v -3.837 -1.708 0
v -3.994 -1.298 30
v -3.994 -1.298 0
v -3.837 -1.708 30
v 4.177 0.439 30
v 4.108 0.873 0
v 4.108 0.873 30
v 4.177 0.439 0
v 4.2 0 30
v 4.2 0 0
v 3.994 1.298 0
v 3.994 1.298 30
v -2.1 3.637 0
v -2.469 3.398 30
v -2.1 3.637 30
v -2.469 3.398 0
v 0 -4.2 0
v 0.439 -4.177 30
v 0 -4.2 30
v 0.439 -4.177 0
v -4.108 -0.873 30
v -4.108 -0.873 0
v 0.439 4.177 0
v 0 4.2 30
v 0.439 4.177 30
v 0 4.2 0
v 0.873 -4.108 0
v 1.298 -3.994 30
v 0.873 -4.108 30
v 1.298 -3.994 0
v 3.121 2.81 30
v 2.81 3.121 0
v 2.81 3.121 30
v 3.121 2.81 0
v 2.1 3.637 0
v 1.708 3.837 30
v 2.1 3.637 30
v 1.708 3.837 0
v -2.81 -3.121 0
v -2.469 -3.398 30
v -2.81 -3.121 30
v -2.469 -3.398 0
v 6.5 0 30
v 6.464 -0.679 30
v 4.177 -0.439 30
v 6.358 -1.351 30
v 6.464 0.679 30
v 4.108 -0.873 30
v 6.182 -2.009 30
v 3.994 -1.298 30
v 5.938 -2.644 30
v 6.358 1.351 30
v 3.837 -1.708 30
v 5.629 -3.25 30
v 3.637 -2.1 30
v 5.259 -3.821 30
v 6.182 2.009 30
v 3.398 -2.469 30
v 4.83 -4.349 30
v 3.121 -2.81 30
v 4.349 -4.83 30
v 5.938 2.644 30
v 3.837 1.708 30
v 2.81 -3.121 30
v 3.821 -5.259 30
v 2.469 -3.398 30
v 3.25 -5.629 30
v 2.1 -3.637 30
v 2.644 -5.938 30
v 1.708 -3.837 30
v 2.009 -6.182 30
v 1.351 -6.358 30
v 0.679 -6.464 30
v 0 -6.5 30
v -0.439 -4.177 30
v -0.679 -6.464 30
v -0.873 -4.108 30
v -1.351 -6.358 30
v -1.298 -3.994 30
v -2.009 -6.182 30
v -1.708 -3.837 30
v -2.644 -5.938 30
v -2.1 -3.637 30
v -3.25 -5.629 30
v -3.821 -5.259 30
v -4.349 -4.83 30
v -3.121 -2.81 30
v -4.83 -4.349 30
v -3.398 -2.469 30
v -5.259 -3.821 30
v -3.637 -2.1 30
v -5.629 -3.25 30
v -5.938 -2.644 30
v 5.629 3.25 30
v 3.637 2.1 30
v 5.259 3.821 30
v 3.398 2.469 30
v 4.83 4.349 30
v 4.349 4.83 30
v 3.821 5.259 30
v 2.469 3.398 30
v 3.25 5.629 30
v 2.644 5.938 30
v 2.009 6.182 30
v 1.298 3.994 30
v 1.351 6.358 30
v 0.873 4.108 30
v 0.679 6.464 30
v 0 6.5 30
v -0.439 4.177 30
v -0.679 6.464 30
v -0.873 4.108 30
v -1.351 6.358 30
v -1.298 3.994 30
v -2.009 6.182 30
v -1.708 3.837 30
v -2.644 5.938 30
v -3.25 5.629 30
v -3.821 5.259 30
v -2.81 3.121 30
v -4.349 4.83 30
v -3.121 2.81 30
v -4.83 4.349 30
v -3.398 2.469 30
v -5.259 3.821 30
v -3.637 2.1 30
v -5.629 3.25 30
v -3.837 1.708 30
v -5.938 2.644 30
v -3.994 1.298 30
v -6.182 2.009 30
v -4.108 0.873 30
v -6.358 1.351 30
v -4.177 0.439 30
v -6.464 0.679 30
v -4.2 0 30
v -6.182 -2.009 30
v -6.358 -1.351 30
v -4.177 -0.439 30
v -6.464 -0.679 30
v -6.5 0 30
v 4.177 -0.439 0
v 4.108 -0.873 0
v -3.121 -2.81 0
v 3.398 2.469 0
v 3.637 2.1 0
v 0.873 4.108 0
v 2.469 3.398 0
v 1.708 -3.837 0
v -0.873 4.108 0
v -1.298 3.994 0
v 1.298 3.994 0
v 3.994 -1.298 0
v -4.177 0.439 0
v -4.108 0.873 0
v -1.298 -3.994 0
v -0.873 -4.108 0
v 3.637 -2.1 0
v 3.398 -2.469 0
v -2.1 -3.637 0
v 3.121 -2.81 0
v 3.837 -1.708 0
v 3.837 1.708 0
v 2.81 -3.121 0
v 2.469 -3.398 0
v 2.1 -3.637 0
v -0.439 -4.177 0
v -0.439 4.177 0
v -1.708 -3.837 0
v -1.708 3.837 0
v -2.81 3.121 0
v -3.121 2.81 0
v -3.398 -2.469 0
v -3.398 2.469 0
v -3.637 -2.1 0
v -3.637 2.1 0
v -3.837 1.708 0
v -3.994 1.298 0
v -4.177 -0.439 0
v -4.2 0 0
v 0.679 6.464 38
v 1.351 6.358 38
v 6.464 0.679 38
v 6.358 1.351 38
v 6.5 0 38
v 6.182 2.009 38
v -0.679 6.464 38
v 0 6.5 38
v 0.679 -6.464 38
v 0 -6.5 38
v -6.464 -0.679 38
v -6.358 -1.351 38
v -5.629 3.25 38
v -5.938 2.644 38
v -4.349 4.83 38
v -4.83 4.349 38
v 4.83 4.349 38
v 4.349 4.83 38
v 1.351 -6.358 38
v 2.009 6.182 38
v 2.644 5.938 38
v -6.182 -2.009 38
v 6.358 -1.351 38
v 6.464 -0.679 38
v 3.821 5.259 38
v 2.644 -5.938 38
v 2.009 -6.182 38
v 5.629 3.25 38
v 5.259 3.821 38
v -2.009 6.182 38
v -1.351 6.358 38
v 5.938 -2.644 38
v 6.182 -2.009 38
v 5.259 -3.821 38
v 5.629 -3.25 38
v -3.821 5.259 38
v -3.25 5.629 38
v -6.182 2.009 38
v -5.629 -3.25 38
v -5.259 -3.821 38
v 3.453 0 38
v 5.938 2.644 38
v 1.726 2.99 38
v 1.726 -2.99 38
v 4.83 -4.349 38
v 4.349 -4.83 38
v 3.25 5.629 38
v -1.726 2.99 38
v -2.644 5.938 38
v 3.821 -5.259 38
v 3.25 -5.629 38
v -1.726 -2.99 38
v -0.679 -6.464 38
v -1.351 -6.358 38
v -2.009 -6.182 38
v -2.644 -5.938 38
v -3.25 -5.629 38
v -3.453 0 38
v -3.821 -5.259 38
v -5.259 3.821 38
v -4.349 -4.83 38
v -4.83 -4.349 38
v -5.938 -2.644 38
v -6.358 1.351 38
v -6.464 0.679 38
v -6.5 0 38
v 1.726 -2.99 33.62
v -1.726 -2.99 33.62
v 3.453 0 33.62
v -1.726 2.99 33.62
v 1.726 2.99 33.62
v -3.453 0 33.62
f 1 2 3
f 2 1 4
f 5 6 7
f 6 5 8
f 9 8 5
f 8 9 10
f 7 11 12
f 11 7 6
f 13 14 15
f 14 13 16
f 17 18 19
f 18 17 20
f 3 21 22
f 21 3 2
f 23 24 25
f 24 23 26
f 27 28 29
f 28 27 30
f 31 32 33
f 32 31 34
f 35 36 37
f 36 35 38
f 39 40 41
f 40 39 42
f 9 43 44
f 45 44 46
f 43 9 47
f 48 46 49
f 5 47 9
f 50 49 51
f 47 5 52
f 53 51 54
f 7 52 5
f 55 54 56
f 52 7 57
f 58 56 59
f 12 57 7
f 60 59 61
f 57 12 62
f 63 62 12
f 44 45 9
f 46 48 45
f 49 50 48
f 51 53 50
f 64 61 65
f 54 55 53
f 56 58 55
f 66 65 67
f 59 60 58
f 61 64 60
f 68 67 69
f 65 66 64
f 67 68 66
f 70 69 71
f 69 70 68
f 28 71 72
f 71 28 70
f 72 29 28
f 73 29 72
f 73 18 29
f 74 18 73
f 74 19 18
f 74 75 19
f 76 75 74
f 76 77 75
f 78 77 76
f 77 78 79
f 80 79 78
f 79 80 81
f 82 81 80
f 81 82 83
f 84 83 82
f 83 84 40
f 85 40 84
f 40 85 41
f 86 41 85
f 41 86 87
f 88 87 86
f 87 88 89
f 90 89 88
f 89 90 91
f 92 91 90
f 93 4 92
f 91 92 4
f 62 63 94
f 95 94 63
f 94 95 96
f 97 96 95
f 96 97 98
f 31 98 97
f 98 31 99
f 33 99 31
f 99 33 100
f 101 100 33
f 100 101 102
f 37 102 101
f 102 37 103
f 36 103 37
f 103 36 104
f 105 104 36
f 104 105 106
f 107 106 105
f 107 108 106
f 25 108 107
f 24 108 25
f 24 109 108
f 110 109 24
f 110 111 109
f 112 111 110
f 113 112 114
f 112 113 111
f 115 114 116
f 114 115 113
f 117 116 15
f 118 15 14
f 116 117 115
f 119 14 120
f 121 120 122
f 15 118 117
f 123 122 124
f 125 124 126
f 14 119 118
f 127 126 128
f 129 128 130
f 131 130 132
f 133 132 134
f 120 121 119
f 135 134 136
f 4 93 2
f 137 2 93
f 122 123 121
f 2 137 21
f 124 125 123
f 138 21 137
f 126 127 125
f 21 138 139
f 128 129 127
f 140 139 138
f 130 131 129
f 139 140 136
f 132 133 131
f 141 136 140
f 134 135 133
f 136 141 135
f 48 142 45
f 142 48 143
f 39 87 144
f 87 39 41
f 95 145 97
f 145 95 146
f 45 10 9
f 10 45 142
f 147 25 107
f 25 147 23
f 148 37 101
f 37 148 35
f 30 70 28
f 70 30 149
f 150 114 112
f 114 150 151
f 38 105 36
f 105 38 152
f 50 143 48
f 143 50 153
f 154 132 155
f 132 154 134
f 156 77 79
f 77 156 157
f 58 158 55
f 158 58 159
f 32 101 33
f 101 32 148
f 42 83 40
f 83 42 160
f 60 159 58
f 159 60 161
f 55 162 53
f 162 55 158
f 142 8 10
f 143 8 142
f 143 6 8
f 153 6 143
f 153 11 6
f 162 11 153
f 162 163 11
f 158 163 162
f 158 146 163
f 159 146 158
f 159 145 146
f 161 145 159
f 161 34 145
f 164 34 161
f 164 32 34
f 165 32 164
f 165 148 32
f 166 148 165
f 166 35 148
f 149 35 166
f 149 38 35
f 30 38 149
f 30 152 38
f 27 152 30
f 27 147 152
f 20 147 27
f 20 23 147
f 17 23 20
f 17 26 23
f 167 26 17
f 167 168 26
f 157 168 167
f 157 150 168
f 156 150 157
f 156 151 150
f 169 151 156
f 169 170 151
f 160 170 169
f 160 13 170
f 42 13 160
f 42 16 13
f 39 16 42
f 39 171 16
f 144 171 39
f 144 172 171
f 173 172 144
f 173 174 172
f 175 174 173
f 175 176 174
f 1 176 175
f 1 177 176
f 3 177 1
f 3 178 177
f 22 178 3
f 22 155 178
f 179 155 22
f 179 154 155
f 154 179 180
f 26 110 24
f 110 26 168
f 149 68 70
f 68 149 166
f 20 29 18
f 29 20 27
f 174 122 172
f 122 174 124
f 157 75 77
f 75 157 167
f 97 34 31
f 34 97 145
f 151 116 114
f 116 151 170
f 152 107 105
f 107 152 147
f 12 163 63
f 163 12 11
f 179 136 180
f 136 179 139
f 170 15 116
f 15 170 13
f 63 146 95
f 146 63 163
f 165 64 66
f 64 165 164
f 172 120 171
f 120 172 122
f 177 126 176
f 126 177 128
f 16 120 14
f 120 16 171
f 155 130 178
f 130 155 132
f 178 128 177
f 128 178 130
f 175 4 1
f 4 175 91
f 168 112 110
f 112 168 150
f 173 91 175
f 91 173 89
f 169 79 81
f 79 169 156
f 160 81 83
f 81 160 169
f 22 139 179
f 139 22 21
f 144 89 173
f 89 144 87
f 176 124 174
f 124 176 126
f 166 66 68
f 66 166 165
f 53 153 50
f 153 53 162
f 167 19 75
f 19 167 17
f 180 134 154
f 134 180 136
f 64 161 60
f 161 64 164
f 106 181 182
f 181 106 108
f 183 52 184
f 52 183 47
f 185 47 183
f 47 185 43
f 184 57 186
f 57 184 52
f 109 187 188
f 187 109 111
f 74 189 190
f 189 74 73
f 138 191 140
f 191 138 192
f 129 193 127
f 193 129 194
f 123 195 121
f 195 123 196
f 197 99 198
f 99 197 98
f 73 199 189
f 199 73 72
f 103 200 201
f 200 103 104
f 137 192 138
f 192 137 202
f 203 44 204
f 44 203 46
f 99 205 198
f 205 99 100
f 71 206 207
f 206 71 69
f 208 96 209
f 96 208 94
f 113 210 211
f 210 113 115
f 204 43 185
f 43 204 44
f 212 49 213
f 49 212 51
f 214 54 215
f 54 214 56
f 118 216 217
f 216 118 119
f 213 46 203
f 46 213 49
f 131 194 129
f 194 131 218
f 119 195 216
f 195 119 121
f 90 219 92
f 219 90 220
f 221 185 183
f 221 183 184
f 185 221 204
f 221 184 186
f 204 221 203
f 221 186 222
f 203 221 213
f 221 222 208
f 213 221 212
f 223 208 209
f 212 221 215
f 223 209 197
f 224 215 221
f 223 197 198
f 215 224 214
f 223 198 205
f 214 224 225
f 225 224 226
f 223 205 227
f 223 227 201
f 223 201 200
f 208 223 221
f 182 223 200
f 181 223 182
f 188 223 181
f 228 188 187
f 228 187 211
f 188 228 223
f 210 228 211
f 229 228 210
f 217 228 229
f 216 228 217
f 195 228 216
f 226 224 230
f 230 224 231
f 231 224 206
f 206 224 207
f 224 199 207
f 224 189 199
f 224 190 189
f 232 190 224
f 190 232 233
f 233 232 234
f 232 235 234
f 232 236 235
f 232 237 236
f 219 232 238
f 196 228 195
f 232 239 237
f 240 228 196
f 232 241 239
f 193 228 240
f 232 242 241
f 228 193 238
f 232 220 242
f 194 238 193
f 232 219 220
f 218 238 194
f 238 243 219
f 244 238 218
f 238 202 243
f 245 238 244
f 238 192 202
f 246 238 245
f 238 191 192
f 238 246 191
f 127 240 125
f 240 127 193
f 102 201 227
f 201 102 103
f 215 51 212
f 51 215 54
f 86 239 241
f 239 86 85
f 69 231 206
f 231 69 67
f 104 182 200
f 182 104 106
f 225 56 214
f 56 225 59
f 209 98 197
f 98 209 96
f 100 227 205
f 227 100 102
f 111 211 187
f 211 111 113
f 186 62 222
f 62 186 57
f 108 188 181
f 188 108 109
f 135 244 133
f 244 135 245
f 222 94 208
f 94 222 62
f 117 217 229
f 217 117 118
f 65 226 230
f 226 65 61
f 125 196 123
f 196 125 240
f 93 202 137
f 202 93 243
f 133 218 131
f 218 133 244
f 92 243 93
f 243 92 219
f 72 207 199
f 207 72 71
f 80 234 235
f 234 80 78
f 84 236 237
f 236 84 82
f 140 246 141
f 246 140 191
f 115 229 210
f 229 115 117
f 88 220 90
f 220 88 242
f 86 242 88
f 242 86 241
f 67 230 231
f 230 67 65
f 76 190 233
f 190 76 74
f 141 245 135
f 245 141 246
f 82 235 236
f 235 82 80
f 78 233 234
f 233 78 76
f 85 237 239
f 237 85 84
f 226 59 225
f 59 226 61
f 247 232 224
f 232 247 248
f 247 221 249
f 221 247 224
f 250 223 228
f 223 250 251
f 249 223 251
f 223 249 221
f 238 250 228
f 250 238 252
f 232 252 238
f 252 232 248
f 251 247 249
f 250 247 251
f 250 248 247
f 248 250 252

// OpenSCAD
// Socket-head cap screw, smooth printable representation.
$fn = 60;
eps = 0.02;
shaft_d = 8.4;
head_d = 13;
head_h = 8;
shaft_l = 30;
socket_flat = head_d * 0.46;
socket_depth = head_h * 0.55;
difference() {
    union() {
        cylinder(d = shaft_d, h = shaft_l);
        translate([0, 0, shaft_l]) cylinder(d = head_d, h = head_h);
    }
    translate([0, 0, shaft_l + head_h - socket_depth + eps])
        cylinder(d = socket_flat / cos(30), h = socket_depth + eps, $fn = 6);
}
